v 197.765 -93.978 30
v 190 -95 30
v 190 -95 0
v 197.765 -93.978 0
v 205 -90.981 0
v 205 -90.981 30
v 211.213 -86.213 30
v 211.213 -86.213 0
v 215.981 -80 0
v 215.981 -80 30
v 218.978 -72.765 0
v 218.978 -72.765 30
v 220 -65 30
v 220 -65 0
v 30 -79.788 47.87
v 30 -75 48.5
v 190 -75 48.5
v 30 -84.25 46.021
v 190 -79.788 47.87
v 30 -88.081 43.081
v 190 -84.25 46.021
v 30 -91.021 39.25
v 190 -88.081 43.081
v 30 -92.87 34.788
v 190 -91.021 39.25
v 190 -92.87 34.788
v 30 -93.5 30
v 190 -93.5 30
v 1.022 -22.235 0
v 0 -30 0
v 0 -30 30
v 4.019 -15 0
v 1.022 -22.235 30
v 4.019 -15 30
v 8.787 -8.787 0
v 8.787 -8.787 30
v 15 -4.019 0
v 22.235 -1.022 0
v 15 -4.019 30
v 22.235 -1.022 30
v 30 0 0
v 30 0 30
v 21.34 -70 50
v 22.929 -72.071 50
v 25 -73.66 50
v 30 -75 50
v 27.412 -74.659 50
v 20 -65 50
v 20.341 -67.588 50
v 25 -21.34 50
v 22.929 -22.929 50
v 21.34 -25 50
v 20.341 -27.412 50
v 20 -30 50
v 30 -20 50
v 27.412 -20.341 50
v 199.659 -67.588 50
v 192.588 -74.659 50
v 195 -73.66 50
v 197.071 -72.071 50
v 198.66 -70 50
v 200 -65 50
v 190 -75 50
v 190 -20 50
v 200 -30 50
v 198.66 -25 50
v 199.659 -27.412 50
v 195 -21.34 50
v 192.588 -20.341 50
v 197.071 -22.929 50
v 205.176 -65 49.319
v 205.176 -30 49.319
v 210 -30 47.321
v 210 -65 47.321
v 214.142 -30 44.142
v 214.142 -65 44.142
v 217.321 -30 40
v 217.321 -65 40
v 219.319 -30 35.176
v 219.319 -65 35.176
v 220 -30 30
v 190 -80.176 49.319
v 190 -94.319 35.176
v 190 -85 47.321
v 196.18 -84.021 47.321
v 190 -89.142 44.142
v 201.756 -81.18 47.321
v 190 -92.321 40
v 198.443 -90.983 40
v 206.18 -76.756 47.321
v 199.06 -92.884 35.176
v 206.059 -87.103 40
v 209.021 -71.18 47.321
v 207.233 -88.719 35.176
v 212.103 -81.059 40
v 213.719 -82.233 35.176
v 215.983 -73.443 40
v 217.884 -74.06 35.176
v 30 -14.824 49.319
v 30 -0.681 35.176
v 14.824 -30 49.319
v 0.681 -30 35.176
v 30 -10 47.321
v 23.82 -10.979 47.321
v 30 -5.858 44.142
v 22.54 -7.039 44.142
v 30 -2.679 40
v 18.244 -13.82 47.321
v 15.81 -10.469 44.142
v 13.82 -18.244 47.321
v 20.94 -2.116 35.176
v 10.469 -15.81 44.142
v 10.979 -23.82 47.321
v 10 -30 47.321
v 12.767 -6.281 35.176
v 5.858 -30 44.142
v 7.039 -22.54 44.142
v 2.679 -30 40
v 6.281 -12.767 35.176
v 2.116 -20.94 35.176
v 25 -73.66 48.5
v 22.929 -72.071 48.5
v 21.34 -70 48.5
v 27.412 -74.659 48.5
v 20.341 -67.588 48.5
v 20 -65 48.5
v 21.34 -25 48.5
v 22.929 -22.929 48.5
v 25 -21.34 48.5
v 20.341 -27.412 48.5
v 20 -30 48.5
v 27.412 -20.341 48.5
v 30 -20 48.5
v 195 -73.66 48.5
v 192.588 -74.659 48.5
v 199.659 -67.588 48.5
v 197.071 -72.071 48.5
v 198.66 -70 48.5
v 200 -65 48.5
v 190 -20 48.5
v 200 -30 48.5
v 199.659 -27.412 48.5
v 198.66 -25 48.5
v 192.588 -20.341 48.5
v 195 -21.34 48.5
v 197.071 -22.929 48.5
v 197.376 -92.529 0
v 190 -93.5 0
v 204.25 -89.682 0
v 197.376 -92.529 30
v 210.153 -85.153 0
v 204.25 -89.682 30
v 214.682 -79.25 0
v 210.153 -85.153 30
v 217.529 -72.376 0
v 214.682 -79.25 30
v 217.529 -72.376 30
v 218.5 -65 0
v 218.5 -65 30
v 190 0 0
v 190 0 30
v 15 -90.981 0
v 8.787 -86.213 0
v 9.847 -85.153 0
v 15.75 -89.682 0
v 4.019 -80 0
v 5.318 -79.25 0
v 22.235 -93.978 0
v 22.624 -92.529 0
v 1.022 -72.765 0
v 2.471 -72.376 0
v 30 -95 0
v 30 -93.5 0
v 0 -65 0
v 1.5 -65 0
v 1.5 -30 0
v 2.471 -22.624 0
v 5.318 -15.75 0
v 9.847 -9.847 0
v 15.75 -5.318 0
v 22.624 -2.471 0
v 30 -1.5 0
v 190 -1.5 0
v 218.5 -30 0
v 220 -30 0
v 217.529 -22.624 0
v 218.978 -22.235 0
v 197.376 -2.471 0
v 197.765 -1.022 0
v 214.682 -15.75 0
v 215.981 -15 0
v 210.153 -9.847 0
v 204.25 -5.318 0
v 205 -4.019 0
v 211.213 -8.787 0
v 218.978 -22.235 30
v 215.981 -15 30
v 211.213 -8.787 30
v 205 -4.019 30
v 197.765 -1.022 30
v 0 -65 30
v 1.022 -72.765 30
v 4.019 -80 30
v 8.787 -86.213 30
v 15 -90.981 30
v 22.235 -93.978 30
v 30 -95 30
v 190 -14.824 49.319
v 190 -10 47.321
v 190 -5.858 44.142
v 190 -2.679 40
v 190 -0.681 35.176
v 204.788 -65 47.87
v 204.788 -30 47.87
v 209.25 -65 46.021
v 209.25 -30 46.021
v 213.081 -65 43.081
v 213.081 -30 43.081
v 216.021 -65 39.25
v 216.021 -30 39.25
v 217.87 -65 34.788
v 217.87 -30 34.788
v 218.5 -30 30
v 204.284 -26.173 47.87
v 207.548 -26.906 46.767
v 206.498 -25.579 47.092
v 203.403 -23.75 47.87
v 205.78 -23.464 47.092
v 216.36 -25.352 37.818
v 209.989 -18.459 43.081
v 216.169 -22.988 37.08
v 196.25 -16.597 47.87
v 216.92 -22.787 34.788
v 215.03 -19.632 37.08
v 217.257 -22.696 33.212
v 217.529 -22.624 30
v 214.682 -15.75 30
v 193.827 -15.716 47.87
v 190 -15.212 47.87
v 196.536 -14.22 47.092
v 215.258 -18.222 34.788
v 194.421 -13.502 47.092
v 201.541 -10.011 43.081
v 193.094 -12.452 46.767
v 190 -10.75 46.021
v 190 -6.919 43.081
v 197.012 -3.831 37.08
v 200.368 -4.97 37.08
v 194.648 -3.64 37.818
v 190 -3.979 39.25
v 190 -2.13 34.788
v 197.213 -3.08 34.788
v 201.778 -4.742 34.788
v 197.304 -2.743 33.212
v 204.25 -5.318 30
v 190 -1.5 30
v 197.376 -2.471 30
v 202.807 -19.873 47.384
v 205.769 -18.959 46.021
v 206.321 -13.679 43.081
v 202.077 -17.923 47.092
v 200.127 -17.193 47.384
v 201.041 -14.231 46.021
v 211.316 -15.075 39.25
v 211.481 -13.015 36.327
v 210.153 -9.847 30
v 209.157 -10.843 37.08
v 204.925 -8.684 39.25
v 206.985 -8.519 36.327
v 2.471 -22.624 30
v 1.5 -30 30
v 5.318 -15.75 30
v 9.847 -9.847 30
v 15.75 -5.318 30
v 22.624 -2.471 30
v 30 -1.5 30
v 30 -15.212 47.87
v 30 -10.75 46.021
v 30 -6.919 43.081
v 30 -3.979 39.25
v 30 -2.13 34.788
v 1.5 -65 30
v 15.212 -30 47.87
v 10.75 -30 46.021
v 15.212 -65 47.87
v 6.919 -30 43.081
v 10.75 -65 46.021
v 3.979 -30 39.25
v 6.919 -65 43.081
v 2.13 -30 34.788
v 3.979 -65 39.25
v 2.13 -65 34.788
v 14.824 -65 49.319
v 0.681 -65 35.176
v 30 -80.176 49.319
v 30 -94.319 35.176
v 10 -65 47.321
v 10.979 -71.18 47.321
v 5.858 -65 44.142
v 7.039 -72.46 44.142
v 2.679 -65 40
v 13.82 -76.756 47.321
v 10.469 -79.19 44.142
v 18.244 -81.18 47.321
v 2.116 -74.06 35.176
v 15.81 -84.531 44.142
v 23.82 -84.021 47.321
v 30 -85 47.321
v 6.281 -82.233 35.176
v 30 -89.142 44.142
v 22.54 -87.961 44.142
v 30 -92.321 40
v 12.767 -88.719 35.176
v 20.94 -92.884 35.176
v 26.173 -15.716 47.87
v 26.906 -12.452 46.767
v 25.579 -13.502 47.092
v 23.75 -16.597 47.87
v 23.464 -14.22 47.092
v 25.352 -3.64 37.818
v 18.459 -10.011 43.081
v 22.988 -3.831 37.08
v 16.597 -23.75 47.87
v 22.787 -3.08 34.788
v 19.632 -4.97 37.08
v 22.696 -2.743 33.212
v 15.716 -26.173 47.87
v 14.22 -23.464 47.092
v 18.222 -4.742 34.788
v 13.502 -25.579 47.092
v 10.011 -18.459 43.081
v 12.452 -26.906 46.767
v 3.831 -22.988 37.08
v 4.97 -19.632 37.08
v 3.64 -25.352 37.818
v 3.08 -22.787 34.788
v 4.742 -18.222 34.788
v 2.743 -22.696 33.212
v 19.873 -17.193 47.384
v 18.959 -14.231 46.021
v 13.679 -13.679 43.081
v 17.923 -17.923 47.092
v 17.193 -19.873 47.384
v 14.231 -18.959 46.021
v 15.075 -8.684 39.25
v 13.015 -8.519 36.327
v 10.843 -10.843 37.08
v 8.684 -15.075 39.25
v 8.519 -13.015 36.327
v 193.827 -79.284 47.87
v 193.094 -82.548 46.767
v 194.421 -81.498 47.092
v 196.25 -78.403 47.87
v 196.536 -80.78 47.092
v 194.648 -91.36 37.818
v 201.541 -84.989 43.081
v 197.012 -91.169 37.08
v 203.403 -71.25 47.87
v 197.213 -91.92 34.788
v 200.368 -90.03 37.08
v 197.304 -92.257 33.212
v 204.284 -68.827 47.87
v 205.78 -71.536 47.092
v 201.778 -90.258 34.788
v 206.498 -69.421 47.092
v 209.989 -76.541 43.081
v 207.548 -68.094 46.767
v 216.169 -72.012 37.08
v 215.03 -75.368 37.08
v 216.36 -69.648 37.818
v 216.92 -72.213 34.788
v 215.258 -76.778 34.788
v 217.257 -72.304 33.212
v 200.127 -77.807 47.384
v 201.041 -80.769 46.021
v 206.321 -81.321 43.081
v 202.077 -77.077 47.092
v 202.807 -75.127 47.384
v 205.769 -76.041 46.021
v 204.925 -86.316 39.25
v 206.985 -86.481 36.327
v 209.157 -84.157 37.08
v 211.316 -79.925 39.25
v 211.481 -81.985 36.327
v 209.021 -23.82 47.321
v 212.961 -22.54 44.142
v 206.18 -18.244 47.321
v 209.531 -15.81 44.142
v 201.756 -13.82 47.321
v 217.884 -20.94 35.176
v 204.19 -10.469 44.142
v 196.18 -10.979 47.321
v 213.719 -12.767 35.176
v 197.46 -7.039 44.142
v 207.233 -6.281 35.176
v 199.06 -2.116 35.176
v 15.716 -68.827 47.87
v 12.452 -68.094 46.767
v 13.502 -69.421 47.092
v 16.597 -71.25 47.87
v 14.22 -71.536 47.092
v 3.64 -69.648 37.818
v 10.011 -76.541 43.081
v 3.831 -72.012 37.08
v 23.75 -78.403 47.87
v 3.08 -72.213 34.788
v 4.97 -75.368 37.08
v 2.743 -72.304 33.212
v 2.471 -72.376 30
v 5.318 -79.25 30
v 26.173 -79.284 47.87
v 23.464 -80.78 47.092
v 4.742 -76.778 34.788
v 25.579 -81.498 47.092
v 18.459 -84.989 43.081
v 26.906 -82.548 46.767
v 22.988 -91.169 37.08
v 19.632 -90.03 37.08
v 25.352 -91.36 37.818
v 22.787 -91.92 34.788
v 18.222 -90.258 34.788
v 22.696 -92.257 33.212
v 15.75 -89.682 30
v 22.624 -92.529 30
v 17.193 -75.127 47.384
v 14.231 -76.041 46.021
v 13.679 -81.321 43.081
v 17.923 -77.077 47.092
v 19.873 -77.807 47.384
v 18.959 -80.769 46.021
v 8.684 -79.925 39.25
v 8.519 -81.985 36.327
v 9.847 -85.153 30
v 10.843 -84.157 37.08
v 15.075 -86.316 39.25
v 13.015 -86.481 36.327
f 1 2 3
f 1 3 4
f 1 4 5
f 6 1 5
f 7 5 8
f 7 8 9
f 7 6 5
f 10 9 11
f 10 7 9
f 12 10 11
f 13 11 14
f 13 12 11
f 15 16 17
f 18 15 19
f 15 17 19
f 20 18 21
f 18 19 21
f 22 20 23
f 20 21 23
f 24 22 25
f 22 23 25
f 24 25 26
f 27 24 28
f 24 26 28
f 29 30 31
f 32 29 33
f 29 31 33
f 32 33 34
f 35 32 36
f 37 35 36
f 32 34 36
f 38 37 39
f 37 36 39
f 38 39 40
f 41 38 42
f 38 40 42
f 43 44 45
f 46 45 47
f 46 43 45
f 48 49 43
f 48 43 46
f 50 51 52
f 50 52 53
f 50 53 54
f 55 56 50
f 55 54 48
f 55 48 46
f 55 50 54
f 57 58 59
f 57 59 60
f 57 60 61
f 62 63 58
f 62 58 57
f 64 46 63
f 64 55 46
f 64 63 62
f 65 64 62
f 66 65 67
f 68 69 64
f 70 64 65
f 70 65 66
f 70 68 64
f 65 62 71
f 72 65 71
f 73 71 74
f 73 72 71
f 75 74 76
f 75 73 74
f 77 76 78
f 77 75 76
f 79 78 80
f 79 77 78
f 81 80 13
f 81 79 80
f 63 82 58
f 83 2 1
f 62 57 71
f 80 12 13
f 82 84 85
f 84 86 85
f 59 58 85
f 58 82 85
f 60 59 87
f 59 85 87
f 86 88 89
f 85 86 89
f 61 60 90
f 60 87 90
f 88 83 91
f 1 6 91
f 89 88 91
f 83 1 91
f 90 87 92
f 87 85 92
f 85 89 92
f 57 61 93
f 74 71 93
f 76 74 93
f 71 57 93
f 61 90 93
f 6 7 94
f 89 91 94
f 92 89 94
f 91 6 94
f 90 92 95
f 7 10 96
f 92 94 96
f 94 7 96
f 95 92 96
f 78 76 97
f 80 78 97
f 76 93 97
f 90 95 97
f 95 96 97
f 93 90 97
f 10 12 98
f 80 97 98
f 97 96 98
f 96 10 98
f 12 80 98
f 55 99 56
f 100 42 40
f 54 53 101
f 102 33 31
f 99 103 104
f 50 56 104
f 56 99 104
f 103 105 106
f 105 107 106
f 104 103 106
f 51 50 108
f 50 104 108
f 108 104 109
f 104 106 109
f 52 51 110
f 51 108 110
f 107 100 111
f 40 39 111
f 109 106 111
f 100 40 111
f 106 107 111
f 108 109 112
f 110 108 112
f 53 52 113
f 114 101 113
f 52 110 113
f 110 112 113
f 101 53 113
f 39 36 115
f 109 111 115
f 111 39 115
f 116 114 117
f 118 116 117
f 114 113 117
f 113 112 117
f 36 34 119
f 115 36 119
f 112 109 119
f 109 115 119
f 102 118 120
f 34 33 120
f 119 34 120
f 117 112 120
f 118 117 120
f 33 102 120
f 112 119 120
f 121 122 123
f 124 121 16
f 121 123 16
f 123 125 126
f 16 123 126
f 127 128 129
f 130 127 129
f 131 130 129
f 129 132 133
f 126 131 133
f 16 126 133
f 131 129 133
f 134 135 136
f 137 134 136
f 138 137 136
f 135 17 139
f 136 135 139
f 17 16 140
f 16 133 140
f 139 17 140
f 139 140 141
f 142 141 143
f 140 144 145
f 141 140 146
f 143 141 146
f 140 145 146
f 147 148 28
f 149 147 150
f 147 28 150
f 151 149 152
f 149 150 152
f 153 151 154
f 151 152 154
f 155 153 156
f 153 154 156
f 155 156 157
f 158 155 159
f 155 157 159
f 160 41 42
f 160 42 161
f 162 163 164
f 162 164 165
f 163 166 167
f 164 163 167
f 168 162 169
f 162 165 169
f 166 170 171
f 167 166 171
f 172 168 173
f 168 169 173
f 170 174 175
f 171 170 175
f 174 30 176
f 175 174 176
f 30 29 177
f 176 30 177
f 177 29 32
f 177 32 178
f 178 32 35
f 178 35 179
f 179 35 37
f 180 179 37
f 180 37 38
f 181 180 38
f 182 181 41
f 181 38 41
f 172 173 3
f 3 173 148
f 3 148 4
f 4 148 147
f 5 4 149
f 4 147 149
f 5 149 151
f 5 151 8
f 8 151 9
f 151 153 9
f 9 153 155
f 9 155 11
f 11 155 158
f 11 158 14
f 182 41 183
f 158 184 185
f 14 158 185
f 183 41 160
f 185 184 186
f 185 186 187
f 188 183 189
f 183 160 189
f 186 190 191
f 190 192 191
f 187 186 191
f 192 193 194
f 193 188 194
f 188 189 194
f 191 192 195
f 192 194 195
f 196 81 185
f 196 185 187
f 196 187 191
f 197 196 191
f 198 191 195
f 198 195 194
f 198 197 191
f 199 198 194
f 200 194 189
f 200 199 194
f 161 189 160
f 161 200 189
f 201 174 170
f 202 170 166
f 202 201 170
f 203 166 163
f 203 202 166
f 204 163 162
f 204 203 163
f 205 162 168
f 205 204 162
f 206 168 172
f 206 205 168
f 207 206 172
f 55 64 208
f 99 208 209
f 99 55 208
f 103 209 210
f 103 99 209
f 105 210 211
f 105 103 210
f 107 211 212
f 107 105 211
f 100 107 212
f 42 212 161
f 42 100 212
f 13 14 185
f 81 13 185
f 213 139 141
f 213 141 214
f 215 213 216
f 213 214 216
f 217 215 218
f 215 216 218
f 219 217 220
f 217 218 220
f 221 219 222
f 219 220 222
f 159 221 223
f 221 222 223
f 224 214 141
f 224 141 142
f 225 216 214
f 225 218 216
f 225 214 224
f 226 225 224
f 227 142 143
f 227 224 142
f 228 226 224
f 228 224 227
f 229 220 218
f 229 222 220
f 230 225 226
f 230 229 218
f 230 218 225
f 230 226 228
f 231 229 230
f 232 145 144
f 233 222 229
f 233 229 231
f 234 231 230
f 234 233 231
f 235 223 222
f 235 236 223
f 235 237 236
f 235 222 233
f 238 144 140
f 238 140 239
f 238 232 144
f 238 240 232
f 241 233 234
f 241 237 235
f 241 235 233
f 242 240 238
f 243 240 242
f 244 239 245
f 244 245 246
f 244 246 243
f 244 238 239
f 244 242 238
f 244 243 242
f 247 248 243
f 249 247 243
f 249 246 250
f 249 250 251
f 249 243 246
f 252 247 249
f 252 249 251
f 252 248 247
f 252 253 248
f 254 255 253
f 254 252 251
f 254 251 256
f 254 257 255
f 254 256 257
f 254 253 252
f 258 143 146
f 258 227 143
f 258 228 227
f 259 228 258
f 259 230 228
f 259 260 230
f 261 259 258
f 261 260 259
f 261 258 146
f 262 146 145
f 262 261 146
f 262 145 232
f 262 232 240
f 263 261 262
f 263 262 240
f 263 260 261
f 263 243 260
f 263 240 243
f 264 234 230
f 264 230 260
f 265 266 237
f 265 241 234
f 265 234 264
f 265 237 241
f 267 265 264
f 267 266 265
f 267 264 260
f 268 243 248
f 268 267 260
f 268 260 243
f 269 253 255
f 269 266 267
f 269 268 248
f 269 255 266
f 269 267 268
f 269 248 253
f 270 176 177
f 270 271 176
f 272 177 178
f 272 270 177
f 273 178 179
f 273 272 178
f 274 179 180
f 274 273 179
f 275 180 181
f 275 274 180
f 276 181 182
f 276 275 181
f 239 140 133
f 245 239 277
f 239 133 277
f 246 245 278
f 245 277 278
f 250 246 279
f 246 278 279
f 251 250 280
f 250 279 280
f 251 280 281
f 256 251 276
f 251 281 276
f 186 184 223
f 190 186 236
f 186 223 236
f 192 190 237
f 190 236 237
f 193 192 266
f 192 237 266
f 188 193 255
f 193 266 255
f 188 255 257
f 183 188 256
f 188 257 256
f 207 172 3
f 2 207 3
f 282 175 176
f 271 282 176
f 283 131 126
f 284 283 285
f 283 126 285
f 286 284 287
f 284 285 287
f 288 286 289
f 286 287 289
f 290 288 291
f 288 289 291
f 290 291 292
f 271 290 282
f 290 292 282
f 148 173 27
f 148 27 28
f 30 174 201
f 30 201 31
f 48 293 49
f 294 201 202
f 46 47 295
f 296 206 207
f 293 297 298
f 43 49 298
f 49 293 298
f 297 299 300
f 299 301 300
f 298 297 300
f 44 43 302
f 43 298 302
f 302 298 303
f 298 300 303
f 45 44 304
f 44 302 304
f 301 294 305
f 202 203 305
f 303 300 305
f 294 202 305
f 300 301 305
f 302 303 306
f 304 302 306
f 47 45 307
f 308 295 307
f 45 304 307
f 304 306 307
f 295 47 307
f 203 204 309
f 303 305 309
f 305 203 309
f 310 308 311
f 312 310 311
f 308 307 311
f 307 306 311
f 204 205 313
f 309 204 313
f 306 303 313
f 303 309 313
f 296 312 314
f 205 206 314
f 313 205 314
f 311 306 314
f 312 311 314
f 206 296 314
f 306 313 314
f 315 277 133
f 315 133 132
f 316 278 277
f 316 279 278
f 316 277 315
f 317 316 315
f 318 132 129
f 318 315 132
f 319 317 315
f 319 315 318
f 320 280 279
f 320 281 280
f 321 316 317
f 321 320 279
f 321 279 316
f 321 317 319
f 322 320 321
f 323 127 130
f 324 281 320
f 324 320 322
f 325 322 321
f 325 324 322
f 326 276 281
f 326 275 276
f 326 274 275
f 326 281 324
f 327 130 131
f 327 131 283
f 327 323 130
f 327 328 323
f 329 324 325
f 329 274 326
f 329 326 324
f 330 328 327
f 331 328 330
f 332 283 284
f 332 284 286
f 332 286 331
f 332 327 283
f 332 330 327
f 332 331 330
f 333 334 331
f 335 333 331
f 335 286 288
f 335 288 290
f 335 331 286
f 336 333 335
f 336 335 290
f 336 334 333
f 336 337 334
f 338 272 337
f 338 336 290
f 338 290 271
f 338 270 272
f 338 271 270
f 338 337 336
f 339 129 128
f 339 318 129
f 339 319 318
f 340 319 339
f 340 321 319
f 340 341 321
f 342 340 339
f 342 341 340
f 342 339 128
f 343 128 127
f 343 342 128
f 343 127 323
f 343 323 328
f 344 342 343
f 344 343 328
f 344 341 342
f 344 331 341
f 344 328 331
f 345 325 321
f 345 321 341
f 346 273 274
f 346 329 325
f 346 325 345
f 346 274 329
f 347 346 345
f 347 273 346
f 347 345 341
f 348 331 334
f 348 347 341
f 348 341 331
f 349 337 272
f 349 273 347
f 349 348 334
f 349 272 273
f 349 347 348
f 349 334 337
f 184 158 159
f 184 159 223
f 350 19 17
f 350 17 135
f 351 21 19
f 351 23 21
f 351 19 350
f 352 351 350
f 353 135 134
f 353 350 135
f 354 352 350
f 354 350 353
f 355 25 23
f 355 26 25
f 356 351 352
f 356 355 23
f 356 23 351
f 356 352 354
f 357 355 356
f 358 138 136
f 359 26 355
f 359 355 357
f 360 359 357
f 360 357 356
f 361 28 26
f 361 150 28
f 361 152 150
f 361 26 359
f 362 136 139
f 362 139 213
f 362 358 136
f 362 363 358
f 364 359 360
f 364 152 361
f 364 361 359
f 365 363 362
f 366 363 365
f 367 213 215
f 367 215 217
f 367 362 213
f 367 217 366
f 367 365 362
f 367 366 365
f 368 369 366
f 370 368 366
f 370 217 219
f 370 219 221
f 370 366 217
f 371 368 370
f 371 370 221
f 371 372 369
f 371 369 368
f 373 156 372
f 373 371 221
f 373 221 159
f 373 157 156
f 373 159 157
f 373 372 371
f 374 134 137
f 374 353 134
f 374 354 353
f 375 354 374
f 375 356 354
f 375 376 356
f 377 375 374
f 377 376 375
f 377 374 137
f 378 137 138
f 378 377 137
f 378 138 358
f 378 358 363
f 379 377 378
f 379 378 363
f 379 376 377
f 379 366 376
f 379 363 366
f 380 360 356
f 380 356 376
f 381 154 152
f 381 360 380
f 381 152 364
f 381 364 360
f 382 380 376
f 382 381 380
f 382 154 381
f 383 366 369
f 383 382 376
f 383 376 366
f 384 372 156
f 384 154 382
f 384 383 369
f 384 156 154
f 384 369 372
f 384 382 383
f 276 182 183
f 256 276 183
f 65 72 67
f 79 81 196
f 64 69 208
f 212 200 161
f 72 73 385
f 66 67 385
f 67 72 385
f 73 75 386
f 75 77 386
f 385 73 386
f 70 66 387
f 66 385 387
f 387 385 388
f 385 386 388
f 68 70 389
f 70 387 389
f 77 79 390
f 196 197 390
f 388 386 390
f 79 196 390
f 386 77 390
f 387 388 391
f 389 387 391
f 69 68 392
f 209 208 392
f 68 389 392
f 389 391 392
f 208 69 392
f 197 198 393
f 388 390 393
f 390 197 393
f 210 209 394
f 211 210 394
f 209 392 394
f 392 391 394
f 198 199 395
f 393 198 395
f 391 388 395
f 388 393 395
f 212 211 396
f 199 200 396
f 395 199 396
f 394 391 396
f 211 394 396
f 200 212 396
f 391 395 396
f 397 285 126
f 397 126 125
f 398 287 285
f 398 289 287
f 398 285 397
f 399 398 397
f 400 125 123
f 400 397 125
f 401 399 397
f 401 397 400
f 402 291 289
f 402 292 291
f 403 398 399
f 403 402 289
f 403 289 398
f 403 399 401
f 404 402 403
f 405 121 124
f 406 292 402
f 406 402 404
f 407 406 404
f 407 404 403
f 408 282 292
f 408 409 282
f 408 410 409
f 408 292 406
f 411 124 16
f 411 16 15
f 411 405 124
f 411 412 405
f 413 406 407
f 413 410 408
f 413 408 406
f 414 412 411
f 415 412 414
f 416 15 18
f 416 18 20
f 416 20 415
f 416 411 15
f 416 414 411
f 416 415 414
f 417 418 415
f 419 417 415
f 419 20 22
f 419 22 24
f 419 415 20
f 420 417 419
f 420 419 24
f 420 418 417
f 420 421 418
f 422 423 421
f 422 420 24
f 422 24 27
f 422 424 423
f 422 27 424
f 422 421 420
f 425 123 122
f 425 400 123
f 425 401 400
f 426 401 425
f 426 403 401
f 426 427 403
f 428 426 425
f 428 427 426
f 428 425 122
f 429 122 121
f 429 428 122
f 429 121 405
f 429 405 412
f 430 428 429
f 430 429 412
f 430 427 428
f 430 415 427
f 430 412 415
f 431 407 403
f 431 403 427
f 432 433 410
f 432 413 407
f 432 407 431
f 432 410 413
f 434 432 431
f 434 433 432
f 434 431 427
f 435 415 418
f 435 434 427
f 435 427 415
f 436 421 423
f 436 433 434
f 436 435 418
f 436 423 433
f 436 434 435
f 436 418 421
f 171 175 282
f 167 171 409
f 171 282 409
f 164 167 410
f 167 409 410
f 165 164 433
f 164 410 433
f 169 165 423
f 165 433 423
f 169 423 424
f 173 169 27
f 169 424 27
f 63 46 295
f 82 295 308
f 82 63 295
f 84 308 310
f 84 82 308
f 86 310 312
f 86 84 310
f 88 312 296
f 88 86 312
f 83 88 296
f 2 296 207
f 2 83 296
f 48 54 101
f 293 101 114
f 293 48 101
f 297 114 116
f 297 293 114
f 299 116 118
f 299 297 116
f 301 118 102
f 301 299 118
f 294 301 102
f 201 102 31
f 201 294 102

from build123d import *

# Parameters (mm, degrees)
SKETCH1_W           = 220
SKETCH1_H           = 95
BOSS_EXTRUDE1_DEPTH = 50
FILLET1_R           = 30
FILLET2_R           = 20
SHELL1_T            = -1.5


with BuildPart() as part:
    # Sketch1 → Boss-Extrude1 (new body)
    with BuildSketch(Plane.XY):
        with Locations((110, -47.5)):
            Rectangle(SKETCH1_W, SKETCH1_H)
    extrude(amount=BOSS_EXTRUDE1_DEPTH)

    # Fillet1
    fillet1_edges = [part.edges().sort_by_distance(p)[0] for p in [
        (0, 0, 25),
        (220, 0, 25),
        (220, -95, 25),
        (0, -95, 25),
    ]]
    fillet(fillet1_edges, radius=FILLET1_R)

    # Fillet2
    fillet2_edges = [part.edges().sort_by_distance(p)[0] for p in [
        (220, -47.5, 50),
        (110, -95, 50),
        (0, -47.5, 50),
        (110, 0, 50),
        (8.786796564, -8.786796564, 50),
        (8.786796564, -86.213203436, 50),
        (211.213203436, -8.786796564, 50),
        (211.213203436, -86.213203436, 50),
    ]]
    fillet(fillet2_edges, radius=FILLET2_R)

    # Shell1
    shell1_openings = [part.faces().sort_by_distance(p)[0] for p in [
        (110, -47.5, 0),
    ]]
    offset(amount=SHELL1_T, openings=shell1_openings, kind=Kind.INTERSECTION)


solid = part.part
